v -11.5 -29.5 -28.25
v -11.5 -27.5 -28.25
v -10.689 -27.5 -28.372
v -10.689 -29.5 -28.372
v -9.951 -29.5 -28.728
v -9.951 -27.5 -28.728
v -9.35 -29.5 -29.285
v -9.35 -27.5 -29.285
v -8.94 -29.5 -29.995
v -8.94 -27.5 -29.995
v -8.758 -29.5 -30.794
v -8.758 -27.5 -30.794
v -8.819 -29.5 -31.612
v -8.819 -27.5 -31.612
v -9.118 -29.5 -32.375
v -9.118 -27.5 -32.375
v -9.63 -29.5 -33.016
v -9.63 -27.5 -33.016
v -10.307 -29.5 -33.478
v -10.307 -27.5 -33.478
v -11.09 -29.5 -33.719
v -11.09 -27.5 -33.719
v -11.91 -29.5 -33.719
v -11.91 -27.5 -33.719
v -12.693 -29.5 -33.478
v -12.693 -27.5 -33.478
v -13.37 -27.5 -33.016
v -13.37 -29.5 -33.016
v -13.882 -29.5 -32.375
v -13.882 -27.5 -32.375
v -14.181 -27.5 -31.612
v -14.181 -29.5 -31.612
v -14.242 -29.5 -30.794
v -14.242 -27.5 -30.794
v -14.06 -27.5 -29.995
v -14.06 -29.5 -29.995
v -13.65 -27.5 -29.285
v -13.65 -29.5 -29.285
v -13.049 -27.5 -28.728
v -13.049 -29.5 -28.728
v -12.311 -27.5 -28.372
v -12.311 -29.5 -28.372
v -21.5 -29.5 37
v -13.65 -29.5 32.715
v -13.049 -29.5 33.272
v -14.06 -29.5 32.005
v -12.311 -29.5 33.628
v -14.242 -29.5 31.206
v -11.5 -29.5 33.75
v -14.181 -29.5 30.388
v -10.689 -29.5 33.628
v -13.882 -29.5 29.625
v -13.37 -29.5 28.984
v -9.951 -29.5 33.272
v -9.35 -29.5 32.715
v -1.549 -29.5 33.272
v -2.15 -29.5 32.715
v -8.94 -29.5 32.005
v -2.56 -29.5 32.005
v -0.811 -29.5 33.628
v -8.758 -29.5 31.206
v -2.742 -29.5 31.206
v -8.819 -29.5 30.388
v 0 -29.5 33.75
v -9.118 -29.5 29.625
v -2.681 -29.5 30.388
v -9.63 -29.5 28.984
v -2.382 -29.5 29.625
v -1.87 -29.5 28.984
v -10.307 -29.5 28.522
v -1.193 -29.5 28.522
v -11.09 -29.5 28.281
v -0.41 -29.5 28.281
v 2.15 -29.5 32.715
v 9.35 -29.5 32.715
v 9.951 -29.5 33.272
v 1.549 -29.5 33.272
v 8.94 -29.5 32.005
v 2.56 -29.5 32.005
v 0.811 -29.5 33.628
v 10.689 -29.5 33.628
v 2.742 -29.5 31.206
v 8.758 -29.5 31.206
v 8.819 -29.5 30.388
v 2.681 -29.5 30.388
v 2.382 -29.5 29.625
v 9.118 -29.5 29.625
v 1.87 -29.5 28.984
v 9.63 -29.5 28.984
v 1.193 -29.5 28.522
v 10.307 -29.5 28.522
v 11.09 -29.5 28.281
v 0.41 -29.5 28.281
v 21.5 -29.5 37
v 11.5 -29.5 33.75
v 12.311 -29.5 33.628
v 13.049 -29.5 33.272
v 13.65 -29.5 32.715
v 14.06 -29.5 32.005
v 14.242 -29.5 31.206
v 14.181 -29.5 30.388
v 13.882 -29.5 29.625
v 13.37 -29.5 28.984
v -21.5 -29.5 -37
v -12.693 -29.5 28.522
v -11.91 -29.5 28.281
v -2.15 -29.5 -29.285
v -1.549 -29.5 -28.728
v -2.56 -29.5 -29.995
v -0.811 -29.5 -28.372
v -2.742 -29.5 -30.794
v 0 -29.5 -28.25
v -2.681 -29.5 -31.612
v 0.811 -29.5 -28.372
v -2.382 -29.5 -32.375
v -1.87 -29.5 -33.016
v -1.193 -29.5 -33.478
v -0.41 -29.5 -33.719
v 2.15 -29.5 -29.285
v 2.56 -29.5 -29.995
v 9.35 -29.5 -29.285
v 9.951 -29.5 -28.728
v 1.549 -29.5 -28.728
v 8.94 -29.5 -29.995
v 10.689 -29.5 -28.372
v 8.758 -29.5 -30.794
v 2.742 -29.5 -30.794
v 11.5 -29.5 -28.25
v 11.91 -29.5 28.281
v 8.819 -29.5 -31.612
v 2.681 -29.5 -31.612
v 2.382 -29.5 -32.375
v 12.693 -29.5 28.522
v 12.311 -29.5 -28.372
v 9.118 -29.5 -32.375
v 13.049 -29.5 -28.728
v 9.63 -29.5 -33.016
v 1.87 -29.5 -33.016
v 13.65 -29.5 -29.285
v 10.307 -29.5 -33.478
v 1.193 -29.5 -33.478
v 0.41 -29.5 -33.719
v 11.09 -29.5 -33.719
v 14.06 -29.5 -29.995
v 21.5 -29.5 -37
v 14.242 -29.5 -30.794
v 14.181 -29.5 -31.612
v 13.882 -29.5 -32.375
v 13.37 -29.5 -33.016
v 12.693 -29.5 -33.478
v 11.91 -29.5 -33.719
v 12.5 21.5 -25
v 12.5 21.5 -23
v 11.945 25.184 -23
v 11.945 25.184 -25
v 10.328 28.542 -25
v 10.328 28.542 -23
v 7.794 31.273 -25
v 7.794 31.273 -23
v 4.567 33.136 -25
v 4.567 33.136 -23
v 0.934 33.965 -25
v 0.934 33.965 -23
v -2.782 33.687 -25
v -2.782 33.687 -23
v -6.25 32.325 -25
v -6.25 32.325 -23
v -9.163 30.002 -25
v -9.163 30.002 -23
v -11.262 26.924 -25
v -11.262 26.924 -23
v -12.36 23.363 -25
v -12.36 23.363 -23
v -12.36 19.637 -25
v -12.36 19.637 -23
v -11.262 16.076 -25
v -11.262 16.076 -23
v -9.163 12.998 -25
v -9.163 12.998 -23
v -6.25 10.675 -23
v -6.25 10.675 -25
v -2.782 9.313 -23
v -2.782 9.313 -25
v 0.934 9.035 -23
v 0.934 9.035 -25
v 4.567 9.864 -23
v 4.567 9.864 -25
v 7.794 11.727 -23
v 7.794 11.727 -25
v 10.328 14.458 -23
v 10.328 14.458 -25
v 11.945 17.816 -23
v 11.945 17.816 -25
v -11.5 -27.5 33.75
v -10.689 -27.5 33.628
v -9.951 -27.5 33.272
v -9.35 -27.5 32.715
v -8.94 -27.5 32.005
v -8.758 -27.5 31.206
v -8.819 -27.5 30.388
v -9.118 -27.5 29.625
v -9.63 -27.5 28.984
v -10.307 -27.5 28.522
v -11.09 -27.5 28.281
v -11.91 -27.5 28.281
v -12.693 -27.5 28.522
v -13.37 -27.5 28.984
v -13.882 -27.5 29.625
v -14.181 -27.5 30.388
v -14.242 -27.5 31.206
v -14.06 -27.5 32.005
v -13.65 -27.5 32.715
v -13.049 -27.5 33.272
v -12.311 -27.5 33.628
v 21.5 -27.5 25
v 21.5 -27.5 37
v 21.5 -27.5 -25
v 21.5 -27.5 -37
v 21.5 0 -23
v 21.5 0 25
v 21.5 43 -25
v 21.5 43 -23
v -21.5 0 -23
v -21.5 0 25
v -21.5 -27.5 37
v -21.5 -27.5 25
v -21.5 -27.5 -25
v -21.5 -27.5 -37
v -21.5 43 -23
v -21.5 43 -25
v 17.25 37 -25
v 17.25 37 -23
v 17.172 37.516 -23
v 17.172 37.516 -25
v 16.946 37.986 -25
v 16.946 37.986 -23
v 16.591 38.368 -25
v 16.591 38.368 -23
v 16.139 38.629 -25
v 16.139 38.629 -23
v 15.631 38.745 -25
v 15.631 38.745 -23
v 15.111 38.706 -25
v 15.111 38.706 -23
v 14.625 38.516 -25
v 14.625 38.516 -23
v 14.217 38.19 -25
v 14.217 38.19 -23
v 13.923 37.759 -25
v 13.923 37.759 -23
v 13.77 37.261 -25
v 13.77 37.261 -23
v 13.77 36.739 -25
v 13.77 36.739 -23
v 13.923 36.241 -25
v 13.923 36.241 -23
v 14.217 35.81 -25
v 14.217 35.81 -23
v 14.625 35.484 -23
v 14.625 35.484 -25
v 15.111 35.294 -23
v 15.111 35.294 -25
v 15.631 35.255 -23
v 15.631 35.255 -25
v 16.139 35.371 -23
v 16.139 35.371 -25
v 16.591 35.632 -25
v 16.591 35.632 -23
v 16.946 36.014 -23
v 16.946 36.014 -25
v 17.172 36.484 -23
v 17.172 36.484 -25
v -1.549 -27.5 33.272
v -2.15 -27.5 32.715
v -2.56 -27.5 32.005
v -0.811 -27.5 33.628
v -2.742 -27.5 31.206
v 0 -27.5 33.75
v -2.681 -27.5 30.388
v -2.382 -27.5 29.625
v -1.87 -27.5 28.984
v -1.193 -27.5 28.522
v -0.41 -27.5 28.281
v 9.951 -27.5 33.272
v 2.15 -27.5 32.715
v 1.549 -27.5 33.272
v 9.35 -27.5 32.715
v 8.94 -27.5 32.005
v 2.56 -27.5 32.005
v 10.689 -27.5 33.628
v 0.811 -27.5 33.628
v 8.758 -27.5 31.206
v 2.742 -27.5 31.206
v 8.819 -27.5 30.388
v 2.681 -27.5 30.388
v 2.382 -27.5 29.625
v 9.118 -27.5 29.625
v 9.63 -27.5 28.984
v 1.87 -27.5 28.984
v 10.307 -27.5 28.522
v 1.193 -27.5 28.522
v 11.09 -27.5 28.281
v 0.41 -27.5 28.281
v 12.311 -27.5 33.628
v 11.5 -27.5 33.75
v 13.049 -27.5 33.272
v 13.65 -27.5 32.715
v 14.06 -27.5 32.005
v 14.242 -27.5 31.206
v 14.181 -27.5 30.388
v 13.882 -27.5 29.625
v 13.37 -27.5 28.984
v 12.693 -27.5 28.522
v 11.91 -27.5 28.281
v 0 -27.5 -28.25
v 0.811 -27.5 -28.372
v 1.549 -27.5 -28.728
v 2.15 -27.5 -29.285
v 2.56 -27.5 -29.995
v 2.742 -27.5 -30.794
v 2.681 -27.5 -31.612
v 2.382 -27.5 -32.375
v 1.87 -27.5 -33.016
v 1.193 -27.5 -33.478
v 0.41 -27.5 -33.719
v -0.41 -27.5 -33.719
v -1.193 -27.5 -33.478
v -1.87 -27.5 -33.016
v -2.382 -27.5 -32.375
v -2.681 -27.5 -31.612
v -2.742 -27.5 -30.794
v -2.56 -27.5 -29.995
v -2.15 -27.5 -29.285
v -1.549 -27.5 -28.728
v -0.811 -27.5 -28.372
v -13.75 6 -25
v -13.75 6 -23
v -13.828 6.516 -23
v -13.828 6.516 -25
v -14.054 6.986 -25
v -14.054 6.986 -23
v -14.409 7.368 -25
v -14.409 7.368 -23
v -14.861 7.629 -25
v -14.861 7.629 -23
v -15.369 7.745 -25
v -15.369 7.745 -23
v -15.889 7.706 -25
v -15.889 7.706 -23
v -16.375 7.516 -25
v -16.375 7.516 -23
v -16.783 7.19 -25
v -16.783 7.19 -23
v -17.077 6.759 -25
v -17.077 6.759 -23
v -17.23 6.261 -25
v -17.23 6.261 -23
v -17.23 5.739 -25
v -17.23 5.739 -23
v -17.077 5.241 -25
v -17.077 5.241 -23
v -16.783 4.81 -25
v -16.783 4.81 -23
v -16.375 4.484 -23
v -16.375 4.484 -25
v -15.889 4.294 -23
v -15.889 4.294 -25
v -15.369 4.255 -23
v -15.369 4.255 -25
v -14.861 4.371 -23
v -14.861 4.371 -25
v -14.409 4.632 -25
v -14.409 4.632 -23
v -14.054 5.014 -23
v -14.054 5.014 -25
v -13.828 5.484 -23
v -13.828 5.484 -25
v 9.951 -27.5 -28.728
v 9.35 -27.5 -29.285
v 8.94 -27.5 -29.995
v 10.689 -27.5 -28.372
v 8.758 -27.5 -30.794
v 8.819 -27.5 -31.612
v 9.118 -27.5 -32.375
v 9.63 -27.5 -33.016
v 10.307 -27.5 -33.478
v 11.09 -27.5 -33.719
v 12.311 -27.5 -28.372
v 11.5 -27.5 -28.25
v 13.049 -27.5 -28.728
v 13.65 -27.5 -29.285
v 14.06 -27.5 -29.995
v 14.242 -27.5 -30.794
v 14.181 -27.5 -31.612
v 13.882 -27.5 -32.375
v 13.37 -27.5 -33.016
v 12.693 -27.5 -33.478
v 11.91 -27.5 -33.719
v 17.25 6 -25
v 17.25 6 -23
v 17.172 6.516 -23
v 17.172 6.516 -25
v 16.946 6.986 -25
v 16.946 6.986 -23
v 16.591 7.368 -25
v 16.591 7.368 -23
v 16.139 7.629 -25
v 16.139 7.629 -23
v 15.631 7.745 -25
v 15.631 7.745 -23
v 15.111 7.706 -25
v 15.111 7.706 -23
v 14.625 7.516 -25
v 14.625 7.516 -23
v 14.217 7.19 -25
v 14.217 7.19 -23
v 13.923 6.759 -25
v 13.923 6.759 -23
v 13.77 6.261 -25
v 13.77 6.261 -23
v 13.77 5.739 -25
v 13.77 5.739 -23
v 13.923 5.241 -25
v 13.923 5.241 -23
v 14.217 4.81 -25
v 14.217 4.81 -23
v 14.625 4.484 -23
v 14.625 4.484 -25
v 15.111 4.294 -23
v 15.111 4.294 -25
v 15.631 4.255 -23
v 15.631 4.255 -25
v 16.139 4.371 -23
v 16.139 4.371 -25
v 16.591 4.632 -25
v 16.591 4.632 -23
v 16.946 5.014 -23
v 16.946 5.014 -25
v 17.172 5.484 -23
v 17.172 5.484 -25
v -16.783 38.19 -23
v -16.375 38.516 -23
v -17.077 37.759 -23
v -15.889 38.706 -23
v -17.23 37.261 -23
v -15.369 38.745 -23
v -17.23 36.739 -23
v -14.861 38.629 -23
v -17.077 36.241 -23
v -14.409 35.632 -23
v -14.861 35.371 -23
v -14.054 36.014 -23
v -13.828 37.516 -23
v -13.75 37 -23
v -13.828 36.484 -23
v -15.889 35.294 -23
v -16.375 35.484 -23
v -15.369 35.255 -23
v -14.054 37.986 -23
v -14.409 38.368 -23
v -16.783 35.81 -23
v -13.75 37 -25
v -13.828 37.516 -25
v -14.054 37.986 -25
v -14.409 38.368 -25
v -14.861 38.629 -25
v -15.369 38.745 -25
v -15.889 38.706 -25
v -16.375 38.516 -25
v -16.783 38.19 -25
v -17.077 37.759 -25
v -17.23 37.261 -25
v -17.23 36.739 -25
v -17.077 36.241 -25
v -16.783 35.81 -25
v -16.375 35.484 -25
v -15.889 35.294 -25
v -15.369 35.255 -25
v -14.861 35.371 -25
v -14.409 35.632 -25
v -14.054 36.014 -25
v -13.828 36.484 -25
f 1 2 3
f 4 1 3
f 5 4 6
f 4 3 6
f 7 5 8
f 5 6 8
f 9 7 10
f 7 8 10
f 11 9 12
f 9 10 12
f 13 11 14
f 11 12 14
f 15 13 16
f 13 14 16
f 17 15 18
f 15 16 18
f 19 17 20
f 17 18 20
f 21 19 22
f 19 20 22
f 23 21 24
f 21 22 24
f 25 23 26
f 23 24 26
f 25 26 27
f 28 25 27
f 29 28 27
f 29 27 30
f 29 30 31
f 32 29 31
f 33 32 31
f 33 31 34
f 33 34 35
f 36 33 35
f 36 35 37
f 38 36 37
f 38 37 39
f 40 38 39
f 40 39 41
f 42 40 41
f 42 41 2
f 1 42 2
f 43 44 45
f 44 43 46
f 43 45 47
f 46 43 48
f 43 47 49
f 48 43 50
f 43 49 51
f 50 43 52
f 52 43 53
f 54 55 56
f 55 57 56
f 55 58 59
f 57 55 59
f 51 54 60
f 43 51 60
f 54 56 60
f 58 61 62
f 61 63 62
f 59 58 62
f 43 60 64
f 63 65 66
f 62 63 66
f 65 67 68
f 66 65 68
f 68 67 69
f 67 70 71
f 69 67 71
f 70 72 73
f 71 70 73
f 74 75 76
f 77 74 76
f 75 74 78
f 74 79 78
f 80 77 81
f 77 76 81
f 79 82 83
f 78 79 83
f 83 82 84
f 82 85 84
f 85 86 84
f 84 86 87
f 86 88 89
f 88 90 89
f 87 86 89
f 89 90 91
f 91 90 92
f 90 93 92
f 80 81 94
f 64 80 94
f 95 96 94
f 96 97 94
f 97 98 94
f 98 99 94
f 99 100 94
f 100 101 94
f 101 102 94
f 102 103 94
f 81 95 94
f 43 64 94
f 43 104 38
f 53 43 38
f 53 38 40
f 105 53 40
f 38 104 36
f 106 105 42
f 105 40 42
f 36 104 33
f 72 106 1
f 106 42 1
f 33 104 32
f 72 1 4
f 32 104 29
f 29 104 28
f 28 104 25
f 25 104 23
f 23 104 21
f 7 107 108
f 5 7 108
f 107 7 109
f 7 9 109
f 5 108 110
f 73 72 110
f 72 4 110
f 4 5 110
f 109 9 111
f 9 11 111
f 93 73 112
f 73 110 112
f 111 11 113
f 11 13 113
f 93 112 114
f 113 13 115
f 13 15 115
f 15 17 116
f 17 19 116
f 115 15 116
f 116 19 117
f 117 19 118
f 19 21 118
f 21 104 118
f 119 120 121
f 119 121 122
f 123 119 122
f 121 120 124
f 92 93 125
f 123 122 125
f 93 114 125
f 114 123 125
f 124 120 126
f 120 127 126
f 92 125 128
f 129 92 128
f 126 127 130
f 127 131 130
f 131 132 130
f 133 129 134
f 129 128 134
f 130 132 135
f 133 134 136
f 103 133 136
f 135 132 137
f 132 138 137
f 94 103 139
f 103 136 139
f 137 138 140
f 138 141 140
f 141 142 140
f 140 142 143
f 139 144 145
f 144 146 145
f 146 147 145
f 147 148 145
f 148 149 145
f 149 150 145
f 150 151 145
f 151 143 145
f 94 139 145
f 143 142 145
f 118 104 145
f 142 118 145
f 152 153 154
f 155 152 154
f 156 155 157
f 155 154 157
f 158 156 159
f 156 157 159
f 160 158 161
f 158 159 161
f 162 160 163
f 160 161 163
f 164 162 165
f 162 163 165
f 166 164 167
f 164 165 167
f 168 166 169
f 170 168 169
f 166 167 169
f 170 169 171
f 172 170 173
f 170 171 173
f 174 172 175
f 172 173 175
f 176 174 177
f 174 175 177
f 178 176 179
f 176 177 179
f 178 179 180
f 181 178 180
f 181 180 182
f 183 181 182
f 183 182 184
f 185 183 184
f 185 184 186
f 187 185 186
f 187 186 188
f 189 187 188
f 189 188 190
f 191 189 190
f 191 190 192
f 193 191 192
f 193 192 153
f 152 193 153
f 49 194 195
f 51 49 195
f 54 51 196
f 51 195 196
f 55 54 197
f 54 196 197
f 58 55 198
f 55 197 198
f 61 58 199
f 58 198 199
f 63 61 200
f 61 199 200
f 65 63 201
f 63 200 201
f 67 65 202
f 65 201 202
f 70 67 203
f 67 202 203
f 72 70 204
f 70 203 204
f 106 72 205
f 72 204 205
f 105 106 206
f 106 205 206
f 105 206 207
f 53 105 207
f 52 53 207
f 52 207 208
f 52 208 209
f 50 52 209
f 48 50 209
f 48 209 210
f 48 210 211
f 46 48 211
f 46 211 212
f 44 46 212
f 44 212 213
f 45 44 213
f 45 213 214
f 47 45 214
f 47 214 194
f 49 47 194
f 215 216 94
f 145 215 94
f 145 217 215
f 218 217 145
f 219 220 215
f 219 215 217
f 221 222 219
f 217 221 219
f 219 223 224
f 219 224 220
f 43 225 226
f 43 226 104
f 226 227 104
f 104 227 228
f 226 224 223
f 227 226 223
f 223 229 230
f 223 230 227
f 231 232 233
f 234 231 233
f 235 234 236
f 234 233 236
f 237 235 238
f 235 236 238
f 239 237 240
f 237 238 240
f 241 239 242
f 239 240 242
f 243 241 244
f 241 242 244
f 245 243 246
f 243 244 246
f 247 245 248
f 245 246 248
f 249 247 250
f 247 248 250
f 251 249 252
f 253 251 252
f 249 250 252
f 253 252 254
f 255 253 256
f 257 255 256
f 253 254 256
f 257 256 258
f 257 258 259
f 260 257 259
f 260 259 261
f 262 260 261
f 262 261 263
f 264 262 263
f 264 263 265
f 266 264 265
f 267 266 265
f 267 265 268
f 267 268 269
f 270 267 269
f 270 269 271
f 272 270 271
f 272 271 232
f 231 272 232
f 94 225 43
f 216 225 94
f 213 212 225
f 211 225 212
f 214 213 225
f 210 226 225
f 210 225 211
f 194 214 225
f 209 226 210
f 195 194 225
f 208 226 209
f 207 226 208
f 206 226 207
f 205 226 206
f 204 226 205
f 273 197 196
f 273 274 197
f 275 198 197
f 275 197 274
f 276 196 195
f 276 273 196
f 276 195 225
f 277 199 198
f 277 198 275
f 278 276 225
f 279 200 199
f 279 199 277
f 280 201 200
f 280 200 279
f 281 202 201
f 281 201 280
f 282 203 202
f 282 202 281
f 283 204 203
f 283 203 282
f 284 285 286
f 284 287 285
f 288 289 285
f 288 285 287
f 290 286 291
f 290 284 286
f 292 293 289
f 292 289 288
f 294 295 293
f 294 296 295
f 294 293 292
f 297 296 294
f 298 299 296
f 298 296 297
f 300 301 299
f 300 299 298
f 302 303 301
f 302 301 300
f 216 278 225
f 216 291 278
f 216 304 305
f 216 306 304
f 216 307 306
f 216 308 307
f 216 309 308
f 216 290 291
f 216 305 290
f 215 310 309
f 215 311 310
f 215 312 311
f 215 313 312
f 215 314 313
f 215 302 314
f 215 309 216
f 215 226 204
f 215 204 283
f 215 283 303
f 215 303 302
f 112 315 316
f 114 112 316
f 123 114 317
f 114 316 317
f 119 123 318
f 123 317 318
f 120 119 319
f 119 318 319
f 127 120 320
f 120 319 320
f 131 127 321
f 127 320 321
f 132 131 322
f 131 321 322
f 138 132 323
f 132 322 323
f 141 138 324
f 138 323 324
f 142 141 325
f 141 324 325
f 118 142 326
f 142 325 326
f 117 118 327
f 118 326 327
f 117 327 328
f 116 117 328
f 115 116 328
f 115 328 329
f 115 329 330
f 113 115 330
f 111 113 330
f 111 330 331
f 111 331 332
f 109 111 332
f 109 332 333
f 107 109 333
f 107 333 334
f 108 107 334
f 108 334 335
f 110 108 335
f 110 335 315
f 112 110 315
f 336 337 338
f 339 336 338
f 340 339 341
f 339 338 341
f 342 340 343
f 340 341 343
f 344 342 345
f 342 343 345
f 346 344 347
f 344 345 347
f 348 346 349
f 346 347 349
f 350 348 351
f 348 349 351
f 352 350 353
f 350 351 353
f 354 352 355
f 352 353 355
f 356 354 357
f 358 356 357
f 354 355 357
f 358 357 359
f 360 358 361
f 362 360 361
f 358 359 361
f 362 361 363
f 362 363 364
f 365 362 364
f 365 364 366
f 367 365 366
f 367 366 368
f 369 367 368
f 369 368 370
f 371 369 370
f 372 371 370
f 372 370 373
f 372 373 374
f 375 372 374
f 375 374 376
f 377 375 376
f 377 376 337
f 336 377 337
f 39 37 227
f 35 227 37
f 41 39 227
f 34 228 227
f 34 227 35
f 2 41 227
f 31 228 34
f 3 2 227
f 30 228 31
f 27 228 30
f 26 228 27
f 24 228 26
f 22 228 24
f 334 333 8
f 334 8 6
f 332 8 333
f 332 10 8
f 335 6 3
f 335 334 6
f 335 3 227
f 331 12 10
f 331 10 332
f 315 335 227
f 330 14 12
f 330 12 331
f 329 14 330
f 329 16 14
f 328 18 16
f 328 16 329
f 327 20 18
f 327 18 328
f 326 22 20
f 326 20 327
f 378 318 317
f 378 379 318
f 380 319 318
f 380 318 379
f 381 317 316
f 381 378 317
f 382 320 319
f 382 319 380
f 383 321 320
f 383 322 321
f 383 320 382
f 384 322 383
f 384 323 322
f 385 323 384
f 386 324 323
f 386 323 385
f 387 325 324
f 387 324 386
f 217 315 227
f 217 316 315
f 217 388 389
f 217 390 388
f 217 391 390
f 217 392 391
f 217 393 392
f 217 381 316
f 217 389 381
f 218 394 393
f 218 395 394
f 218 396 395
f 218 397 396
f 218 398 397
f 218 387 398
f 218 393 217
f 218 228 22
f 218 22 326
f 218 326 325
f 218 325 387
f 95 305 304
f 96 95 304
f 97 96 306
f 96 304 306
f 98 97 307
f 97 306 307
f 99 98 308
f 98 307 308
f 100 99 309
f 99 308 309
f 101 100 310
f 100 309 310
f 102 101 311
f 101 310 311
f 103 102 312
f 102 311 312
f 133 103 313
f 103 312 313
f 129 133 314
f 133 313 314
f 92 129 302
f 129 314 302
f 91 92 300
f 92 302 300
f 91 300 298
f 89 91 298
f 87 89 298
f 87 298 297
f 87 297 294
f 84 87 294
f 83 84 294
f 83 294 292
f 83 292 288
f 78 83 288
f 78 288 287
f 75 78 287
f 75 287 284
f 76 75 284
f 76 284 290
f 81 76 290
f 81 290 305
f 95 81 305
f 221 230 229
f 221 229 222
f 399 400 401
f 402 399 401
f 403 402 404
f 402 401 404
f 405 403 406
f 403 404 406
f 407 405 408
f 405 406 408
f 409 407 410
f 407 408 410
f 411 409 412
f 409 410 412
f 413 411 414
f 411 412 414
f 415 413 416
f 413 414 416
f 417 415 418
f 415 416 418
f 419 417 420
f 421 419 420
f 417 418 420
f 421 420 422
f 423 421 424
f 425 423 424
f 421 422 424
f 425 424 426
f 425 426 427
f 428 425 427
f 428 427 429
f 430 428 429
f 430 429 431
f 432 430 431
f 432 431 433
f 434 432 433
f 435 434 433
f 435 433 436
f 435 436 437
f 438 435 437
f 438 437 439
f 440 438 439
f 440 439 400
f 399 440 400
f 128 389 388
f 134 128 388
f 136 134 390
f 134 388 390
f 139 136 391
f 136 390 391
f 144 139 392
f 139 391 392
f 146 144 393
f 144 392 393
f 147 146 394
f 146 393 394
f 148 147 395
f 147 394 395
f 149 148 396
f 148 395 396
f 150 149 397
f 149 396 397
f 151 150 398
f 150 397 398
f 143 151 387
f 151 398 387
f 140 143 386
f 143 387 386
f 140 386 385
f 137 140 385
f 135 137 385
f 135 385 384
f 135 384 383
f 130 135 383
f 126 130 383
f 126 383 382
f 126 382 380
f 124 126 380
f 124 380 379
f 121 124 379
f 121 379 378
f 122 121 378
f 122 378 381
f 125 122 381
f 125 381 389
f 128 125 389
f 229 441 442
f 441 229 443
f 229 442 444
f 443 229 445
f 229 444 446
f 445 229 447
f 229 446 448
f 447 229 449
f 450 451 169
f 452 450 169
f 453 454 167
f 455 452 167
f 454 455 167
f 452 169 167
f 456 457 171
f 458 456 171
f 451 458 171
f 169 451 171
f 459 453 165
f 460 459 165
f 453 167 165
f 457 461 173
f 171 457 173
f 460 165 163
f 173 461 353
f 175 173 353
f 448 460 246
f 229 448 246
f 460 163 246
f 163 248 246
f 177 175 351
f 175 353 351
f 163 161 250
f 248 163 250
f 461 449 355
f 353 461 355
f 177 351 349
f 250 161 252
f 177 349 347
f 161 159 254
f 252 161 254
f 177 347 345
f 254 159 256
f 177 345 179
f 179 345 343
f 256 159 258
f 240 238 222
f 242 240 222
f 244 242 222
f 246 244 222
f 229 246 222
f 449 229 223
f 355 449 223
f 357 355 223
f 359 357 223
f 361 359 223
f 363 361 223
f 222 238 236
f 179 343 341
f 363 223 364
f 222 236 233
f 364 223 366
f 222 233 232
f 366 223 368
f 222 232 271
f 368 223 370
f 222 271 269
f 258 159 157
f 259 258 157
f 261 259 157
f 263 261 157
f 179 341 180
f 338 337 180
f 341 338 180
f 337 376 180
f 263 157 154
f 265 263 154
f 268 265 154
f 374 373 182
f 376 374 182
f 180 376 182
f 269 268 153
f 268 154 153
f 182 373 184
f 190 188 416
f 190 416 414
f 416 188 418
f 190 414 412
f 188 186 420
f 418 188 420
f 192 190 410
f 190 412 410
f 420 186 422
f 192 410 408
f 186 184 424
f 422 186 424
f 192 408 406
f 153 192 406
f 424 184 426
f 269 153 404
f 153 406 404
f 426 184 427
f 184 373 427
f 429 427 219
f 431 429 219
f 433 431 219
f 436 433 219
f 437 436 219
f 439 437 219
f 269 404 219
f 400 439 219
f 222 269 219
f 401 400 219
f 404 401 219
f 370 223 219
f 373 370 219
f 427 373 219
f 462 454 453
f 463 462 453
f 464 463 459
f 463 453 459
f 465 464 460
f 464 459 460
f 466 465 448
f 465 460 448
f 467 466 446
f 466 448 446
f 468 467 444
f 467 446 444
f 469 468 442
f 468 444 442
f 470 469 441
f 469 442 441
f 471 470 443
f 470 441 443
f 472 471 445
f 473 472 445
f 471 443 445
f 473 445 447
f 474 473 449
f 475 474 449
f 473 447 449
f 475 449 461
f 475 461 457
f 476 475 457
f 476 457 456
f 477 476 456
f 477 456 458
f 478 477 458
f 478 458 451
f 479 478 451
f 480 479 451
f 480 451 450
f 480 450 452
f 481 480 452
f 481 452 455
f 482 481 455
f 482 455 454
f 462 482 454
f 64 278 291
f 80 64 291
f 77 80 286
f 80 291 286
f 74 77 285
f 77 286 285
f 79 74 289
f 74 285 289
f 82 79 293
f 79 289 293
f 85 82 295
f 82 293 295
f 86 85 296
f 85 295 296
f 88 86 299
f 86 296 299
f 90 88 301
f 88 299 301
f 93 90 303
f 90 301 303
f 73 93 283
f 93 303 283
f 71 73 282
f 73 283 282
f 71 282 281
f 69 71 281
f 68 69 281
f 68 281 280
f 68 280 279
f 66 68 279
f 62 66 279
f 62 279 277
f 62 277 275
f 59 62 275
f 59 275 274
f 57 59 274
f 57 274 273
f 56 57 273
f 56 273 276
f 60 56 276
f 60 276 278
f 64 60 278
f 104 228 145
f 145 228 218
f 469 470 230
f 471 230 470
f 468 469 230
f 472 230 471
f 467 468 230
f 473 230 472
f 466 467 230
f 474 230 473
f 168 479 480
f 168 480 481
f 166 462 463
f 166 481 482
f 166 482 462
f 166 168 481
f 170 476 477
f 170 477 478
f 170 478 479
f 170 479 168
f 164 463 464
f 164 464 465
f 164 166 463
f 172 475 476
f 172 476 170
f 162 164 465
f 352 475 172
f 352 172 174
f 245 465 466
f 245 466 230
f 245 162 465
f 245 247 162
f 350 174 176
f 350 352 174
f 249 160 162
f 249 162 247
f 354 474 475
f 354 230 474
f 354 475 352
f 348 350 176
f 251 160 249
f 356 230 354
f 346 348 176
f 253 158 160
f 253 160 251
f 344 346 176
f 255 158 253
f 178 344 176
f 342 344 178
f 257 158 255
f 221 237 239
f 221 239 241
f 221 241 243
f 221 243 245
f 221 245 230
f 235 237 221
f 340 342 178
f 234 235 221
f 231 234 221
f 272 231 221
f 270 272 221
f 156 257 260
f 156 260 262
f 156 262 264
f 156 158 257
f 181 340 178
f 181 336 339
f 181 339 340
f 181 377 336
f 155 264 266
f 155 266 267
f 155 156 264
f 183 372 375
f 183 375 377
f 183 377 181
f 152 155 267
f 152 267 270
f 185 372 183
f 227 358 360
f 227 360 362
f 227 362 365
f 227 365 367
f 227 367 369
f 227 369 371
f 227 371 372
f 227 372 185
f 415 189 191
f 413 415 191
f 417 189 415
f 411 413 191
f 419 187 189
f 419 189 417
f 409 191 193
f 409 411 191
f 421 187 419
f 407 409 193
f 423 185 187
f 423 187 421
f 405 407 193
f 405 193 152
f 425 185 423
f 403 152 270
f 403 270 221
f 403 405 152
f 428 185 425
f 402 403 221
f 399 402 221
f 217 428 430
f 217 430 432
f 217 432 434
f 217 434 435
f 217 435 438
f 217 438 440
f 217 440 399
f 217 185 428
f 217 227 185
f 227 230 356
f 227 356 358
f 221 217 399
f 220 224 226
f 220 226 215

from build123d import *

# Parameters (mm, degrees)
SKETCH1_W           = 43
SKETCH1_H           = 2
BOSS_EXTRUDE1_DEPTH = 43
SKETCH1_3_W         = 43
SKETCH1_3_H         = 74
BOSS_EXTRUDE2_DEPTH = 29.5
CUT_EXTRUDE1_REACH  = 78.885
SKETCH2_R           = 12.5
SKETCH2_R_2         = 1.75
CUT_EXTRUDE2_REACH  = 62.665
SKETCH1_4_R         = 2.75
LPATTERN1_COUNT     = 2
LPATTERN1_PITCH     = 11.5
LPATTERN1_COL_COUNT = 2
LPATTERN1_COL_PITCH = 11.5
SKETCH3_W           = 43
SKETCH3_H           = 12
CUT_EXTRUDE3_DEPTH  = 27.5


with BuildPart() as part:
    # Sketch1 → Boss-Extrude1 (new body)
    with BuildSketch(Plane(origin=(0, 0, 0), x_dir=(1, 0, 0), z_dir=(0, 1, 0))):
        with Locations((0, 24)):
            Rectangle(SKETCH1_W, SKETCH1_H)
    extrude(amount=BOSS_EXTRUDE1_DEPTH)

    # Sketch1<3> → Boss-Extrude2 (add)
    with BuildSketch(Plane(origin=(0, 0, 0), x_dir=(1, 0, 0), z_dir=(0, 1, 0))):
        Rectangle(SKETCH1_3_W, SKETCH1_3_H)
    extrude(amount=-BOSS_EXTRUDE2_DEPTH)

    # Sketch2 → Cut-Extrude1 (cut, up to next)
    with BuildSketch(Plane.XY.offset(-23), mode=Mode.PRIVATE) as cut_extrude1_sk1:
        with Locations((0, 21.5)):
            Circle(SKETCH2_R)
    cut_extrude1_tool1 = extrude(cut_extrude1_sk1.sketch, amount=-CUT_EXTRUDE1_REACH, mode=Mode.PRIVATE) & part.part
    # Sketch2 → Cut-Extrude1 (cut, up to next)
    with BuildSketch(Plane.XY.offset(-23), mode=Mode.PRIVATE) as cut_extrude1_sk2:
        with Locations((-15.5, 37)):
            Circle(SKETCH2_R_2)
    cut_extrude1_tool2 = extrude(cut_extrude1_sk2.sketch, amount=-CUT_EXTRUDE1_REACH, mode=Mode.PRIVATE) & part.part
    # Sketch2 → Cut-Extrude1 (cut, up to next)
    with BuildSketch(Plane.XY.offset(-23), mode=Mode.PRIVATE) as cut_extrude1_sk3:
        with Locations((15.5, 37)):
            Circle(SKETCH2_R_2)
    cut_extrude1_tool3 = extrude(cut_extrude1_sk3.sketch, amount=-CUT_EXTRUDE1_REACH, mode=Mode.PRIVATE) & part.part
    # Sketch2 → Cut-Extrude1 (cut, up to next)
    with BuildSketch(Plane.XY.offset(-23), mode=Mode.PRIVATE) as cut_extrude1_sk4:
        with Locations((15.5, 6)):
            Circle(SKETCH2_R_2)
    cut_extrude1_tool4 = extrude(cut_extrude1_sk4.sketch, amount=-CUT_EXTRUDE1_REACH, mode=Mode.PRIVATE) & part.part
    # Sketch2 → Cut-Extrude1 (cut, up to next)
    with BuildSketch(Plane.XY.offset(-23), mode=Mode.PRIVATE) as cut_extrude1_sk5:
        with Locations((-15.5, 6)):
            Circle(SKETCH2_R_2)
    cut_extrude1_tool5 = extrude(cut_extrude1_sk5.sketch, amount=-CUT_EXTRUDE1_REACH, mode=Mode.PRIVATE) & part.part
    add(cut_extrude1_tool1.solids().sort_by_distance((0, 21.5, -23))[0], mode=Mode.SUBTRACT)
    add(cut_extrude1_tool2.solids().sort_by_distance((-15.5, 37, -23))[0], mode=Mode.SUBTRACT)
    add(cut_extrude1_tool3.solids().sort_by_distance((15.5, 37, -23))[0], mode=Mode.SUBTRACT)
    add(cut_extrude1_tool4.solids().sort_by_distance((15.5, 6, -23))[0], mode=Mode.SUBTRACT)
    add(cut_extrude1_tool5.solids().sort_by_distance((-15.5, 6, -23))[0], mode=Mode.SUBTRACT)

    # Sketch1<4> → Cut-Extrude2 (cut, up to next)
    with BuildSketch(Plane(origin=(0, 0, 0), x_dir=(1, 0, 0), z_dir=(0, 1, 0)), mode=Mode.PRIVATE) as cut_extrude2_sk1:
        with Locations((0, 31)):
            Circle(SKETCH1_4_R)
    cut_extrude2_tool1 = extrude(cut_extrude2_sk1.sketch, amount=-CUT_EXTRUDE2_REACH, mode=Mode.PRIVATE) & part.part
    # Sketch1<4> → Cut-Extrude2 (cut, up to next)
    with BuildSketch(Plane(origin=(0, 0, 0), x_dir=(1, 0, 0), z_dir=(0, 1, 0)), mode=Mode.PRIVATE) as cut_extrude2_sk2:
        with Locations((0, -31)):
            Circle(SKETCH1_4_R)
    cut_extrude2_tool2 = extrude(cut_extrude2_sk2.sketch, amount=-CUT_EXTRUDE2_REACH, mode=Mode.PRIVATE) & part.part
    cut_extrude2_1 = cut_extrude2_tool1.solids().sort_by_distance((0, 0, -31))[0]
    add(cut_extrude2_1, mode=Mode.SUBTRACT)
    cut_extrude2_2 = cut_extrude2_tool2.solids().sort_by_distance((0, 0, 31))[0]
    add(cut_extrude2_2, mode=Mode.SUBTRACT)
    cut_extrude2 = cut_extrude2_1 + cut_extrude2_2  # Cut-Extrude2 as one shape, for the pattern or mirror that repeats it

    # LPattern1: Cut-Extrude2 ×2
    with Locations(*[(i * LPATTERN1_PITCH, 0, 0) for i in range(1, LPATTERN1_COUNT)]):
        add(cut_extrude2, mode=Mode.SUBTRACT)

    # LPattern1 col: Cut-Extrude2 ×2
    with Locations(*[(-i * LPATTERN1_COL_PITCH, 0, 0) for i in range(1, LPATTERN1_COL_COUNT)]):
        add(cut_extrude2, mode=Mode.SUBTRACT)

    # Sketch3 → Cut-Extrude3 (cut)
    with BuildSketch(Plane(origin=(0, 0, 0), x_dir=(1, 0, 0), z_dir=(0, 1, 0))):
        with Locations((0, -31)):
            Rectangle(SKETCH3_W, SKETCH3_H)
        with Locations((0, 31)):
            Rectangle(SKETCH3_W, SKETCH3_H)
    extrude(amount=-CUT_EXTRUDE3_DEPTH, mode=Mode.SUBTRACT)


solid = part.part
